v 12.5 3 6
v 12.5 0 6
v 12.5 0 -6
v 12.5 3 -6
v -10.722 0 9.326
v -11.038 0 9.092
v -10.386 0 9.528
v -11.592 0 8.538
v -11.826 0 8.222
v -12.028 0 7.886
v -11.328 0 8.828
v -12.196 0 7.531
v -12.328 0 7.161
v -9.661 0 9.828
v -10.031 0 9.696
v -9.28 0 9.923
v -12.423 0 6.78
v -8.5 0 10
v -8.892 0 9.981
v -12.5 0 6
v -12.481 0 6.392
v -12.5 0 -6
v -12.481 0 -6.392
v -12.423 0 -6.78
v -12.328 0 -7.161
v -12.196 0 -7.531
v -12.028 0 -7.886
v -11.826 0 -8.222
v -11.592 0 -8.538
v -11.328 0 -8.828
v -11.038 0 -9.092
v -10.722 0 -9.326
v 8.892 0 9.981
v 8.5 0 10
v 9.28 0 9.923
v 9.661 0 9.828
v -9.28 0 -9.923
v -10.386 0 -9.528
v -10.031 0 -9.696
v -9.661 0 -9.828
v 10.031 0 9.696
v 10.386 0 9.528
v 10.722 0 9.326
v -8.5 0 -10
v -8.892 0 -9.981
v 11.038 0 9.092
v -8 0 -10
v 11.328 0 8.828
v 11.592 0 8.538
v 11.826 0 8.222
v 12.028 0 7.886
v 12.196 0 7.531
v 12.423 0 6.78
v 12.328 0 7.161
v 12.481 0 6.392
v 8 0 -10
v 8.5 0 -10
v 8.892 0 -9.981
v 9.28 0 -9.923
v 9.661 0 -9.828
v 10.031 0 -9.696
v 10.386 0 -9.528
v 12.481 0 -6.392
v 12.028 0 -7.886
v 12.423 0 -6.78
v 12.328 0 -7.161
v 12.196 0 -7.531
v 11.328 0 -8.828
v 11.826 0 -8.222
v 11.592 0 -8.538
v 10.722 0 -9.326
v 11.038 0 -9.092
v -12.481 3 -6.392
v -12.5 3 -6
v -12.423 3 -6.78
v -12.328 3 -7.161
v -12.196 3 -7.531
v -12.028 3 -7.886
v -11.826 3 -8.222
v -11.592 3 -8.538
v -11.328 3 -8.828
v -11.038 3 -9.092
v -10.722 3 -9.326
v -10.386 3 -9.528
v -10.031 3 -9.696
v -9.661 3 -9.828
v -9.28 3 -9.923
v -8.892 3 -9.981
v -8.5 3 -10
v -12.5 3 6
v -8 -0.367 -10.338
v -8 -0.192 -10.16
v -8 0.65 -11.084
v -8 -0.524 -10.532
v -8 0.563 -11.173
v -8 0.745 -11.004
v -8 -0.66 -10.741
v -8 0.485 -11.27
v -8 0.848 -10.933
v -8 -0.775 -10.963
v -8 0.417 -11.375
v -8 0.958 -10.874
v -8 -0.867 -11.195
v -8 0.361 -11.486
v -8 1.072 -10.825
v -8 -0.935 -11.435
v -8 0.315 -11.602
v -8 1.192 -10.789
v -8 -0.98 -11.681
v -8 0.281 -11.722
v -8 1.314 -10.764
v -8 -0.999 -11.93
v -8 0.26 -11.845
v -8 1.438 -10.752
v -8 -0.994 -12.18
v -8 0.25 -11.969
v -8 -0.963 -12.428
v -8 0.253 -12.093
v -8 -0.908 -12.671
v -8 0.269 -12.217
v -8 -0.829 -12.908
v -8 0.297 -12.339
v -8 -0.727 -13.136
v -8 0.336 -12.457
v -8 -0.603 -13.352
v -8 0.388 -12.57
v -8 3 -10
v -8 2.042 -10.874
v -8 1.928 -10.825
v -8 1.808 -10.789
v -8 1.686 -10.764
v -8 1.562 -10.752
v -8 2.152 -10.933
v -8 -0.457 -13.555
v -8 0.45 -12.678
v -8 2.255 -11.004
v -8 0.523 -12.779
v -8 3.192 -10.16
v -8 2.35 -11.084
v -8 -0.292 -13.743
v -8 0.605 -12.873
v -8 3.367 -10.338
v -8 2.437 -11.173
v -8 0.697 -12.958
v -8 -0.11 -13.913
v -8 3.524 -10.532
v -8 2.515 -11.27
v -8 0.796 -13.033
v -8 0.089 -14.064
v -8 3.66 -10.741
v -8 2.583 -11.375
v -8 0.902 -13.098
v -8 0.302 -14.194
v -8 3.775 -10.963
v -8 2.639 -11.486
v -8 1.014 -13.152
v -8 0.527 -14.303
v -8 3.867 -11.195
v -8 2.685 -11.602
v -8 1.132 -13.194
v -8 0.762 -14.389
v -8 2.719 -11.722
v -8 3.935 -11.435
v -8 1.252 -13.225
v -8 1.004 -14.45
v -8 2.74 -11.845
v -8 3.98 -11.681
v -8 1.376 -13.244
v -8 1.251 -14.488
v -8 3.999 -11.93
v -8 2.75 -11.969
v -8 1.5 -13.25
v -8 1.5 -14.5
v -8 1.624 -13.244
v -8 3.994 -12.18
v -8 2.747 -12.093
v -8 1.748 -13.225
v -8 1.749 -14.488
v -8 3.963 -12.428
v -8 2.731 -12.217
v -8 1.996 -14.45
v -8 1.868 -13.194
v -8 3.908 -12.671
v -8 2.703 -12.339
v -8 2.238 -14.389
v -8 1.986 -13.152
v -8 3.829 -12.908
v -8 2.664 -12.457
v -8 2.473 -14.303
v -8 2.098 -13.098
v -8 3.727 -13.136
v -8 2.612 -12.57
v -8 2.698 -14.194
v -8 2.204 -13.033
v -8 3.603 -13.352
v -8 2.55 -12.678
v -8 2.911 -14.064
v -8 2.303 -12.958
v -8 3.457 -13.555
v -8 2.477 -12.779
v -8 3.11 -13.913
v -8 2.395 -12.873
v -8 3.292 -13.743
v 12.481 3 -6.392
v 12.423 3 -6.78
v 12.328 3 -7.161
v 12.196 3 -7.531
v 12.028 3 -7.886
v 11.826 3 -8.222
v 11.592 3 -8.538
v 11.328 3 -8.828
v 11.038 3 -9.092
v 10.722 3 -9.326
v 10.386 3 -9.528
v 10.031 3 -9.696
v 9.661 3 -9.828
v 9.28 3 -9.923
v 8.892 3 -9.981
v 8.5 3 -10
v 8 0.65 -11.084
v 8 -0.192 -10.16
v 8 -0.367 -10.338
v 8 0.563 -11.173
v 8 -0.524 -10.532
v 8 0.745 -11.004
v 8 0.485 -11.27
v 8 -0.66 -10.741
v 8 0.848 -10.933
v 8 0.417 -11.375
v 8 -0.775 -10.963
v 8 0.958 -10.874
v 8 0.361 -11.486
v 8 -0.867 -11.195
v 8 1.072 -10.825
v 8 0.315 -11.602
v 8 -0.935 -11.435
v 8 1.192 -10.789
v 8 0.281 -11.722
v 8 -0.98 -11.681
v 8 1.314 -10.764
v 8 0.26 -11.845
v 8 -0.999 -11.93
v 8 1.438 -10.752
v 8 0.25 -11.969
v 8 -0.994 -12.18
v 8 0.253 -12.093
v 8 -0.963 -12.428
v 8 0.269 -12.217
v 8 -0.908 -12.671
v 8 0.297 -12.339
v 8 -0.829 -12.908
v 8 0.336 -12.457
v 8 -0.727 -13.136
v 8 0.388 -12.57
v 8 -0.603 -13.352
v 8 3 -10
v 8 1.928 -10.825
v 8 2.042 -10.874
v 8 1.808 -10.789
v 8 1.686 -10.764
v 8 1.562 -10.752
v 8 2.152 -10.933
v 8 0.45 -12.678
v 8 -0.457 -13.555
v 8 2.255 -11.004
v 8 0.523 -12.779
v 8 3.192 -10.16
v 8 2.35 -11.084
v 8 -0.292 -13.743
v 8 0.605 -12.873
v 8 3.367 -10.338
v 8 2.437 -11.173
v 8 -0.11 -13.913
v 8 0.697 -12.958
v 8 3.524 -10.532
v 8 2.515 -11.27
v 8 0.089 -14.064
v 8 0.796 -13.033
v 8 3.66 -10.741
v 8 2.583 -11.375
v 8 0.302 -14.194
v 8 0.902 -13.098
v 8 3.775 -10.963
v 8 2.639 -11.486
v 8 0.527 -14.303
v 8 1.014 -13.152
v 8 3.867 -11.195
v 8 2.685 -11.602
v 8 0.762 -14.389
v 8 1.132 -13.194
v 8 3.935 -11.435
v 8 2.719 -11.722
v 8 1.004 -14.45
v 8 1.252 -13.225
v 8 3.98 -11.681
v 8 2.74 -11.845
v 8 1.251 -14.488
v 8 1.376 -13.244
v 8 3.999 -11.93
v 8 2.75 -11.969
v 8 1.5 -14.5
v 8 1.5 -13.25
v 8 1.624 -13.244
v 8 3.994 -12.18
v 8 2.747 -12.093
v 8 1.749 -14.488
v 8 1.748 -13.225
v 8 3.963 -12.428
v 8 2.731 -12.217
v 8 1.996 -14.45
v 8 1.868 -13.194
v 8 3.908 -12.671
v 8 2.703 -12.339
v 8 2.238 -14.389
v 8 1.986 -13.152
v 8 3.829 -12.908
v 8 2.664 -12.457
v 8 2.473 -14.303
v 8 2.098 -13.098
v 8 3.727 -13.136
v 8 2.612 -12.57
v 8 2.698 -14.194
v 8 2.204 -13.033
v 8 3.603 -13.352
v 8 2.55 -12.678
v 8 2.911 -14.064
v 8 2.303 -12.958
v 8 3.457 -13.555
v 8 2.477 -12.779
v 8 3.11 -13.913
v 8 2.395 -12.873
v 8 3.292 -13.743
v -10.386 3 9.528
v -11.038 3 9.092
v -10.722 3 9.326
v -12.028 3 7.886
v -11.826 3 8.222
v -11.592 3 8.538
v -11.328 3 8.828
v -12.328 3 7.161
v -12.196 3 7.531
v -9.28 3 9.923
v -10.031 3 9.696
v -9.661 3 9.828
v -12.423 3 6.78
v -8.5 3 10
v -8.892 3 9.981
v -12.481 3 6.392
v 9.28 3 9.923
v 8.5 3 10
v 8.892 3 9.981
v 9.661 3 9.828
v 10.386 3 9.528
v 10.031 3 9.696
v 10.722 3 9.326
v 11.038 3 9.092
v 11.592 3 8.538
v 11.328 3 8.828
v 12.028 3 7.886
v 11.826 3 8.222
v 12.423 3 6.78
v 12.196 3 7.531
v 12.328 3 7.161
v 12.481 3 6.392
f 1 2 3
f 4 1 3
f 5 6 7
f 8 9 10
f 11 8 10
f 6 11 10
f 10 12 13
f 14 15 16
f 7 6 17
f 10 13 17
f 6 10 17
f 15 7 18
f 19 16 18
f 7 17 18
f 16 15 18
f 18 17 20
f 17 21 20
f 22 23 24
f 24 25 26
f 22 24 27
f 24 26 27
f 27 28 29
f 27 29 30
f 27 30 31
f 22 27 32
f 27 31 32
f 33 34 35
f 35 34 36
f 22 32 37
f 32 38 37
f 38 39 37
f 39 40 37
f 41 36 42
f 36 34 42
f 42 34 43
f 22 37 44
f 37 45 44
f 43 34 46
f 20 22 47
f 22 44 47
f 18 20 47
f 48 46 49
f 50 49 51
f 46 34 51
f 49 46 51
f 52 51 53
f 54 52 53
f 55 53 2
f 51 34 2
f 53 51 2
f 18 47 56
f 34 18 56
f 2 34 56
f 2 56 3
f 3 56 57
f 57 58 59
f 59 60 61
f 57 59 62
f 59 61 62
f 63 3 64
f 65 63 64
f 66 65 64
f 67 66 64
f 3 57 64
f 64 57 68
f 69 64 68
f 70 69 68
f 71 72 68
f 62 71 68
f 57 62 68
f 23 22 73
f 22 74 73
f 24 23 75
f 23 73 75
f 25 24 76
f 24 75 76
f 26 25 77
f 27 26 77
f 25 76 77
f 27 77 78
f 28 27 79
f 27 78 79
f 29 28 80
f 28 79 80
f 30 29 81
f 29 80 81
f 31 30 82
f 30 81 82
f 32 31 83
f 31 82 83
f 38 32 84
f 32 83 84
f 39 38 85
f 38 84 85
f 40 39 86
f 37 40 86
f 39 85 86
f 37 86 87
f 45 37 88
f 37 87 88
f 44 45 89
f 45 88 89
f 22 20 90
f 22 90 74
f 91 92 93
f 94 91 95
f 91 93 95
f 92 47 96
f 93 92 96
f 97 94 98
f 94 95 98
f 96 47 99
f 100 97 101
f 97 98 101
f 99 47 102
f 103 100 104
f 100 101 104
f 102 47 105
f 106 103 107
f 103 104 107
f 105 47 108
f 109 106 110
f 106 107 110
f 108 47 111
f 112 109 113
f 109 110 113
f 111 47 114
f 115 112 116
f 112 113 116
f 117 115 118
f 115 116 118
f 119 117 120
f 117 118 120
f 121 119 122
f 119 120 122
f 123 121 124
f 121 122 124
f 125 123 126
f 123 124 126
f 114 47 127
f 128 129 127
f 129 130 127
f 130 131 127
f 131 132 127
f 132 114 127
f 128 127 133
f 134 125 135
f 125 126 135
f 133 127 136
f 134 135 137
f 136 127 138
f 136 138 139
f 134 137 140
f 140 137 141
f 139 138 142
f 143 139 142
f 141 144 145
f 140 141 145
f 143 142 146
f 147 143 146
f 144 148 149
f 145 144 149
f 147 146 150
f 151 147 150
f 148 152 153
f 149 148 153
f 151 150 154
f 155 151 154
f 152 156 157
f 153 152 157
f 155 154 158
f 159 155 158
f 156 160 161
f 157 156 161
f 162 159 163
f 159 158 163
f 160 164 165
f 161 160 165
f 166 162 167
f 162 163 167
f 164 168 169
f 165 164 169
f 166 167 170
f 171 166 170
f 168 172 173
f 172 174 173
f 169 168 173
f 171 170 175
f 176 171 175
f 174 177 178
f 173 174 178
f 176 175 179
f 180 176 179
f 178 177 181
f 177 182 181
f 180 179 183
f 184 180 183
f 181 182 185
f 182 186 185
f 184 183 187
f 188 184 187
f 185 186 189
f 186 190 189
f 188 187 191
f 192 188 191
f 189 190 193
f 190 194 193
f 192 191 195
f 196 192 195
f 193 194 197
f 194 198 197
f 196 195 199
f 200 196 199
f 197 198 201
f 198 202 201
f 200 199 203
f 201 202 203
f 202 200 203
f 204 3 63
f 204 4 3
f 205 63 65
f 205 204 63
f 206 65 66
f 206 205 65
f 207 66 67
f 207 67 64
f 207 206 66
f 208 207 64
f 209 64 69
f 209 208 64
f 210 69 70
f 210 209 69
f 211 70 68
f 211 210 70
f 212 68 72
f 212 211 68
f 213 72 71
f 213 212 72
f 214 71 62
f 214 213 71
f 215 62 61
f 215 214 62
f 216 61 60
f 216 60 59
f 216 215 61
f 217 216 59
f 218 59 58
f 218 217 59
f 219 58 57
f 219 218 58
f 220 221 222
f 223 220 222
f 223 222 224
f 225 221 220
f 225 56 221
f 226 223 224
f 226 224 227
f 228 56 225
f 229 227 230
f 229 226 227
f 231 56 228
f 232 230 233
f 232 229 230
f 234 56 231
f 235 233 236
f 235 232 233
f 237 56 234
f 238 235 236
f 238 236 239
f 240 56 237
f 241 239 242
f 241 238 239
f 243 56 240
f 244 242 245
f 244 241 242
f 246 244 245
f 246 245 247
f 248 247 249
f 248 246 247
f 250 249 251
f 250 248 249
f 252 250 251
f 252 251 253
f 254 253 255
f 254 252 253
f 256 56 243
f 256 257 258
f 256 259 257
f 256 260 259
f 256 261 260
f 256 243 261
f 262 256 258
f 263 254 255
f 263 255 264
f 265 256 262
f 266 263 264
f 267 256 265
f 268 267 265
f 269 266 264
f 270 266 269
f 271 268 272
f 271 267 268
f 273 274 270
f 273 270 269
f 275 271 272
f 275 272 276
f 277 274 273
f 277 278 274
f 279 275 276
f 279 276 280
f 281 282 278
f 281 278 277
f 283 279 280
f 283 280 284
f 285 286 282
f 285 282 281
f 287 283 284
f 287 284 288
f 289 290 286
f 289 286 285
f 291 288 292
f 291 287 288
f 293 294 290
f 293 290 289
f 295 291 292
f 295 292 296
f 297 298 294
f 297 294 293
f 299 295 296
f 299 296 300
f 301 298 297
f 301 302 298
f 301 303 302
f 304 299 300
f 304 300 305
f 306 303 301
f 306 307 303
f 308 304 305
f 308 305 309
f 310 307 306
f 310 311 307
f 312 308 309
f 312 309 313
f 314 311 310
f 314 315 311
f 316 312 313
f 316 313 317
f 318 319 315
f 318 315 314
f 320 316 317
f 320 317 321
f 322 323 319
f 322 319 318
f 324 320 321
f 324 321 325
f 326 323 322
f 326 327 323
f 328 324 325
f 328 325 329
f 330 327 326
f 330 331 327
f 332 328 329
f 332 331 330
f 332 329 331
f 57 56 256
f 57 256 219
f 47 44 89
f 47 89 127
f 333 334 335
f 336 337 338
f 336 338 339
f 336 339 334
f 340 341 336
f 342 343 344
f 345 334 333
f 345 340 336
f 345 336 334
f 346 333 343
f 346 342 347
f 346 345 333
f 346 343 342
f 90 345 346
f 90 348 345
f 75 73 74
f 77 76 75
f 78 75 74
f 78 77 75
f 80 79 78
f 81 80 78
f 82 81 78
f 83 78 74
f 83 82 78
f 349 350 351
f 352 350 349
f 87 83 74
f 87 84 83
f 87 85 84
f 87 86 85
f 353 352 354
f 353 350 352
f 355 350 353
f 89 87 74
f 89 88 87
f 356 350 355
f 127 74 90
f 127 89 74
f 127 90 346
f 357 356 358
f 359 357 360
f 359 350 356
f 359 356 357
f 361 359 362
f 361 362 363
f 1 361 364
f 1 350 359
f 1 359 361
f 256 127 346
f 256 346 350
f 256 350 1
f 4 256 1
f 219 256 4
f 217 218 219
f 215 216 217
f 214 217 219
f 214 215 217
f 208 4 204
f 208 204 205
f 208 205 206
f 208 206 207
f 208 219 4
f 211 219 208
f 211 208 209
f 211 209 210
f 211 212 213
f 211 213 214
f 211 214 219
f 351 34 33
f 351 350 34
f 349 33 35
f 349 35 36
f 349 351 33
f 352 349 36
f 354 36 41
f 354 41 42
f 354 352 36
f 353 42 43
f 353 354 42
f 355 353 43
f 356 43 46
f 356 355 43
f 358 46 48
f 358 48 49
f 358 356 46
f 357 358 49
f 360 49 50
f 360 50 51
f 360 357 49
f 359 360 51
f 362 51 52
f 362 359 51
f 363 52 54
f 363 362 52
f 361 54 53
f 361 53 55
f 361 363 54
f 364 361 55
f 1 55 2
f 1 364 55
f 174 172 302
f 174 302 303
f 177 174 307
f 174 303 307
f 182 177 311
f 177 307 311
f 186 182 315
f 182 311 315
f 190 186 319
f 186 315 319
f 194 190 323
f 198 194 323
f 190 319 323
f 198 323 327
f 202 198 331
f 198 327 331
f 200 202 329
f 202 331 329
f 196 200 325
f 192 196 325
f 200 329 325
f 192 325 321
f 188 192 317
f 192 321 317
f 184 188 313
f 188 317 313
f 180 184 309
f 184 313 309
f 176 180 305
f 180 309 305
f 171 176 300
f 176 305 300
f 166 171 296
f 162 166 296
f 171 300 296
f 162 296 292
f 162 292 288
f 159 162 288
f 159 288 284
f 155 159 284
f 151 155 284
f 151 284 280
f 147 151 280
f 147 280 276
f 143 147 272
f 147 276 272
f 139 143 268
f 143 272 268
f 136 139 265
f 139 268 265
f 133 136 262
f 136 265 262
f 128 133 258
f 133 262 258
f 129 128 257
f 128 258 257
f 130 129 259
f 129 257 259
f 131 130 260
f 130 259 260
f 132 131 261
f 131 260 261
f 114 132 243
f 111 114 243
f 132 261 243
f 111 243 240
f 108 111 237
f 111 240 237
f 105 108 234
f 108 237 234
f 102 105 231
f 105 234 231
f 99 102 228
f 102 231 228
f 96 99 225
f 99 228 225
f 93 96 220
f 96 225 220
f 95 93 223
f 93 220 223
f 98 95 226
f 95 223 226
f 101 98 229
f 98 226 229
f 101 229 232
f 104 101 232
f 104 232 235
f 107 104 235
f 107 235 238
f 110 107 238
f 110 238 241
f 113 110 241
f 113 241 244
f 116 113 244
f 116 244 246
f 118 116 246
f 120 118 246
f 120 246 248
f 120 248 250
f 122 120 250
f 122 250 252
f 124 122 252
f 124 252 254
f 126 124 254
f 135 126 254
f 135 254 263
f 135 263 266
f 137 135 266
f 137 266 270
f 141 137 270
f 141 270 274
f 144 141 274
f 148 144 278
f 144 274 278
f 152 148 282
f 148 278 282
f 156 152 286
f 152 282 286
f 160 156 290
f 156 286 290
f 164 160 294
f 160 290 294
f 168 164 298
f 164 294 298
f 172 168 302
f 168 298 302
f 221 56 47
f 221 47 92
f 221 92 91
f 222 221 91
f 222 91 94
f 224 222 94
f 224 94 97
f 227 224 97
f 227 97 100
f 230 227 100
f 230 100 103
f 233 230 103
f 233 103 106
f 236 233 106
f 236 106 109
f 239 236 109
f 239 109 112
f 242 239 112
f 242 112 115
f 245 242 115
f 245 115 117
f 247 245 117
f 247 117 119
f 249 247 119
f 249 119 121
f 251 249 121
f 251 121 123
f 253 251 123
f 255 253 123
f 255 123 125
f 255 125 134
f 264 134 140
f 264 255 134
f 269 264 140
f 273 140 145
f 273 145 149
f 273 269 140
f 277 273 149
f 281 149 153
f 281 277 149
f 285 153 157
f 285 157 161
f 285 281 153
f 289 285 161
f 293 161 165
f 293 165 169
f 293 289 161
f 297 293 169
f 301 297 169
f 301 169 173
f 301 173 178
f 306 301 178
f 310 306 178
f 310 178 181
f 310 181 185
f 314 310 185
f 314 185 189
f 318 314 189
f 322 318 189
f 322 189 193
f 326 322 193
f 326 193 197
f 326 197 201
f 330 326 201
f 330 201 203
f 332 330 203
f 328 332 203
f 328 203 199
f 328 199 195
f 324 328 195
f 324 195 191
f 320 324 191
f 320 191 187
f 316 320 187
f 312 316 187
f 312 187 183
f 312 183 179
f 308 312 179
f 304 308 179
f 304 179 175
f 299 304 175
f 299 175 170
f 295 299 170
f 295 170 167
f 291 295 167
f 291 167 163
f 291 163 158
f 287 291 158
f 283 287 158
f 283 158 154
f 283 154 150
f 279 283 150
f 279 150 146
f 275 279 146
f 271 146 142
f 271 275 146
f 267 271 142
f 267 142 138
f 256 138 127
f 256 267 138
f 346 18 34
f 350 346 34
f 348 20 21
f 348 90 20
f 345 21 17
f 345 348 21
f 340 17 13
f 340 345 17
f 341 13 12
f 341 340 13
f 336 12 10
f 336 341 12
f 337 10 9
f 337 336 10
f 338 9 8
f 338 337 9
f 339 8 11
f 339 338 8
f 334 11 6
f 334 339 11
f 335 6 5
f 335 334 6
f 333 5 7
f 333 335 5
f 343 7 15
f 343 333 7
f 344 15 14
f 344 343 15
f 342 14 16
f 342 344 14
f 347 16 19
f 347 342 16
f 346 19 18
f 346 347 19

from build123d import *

# Parameters (mm, degrees)
SKETCH2_W           = 25
SKETCH2_H           = 20
BOSS_EXTRUDE1_DEPTH = 3
FILLET1_R           = 4
SKETCH4_R           = 2.5
BOSS_EXTRUDE2_DEPTH = 8
SKETCH5_R           = 1.25
CUT_EXTRUDE1_DEPTH  = 16


with BuildPart() as part:
    # Sketch2 → Boss-Extrude1 (new body)
    with BuildSketch(Plane(origin=(0, 0, 0), x_dir=(1, 0, 0), z_dir=(0, 1, 0))):
        Rectangle(SKETCH2_W, SKETCH2_H)
    extrude(amount=BOSS_EXTRUDE1_DEPTH)

    # Fillet1
    fillet1_edges = [part.edges().sort_by_distance(p)[0] for p in [
        (12.5, 1.5, 10),
        (-12.5, 1.5, 10),
        (-12.5, 1.5, -10),
        (12.5, 1.5, -10),
    ]]
    fillet(fillet1_edges, radius=FILLET1_R)

    # Sketch4 → Boss-Extrude2 (add, symmetric)
    with BuildSketch(Plane(origin=(0, 0, 0), x_dir=(0, 0, -1), z_dir=(1, 0, 0))):
        with Locations((12, 1.5)):
            Circle(SKETCH4_R)
    extrude(amount=BOSS_EXTRUDE2_DEPTH, both=True)

    # Sketch5 → Cut-Extrude1 (cut)
    with BuildSketch(Plane(origin=(8, 0, 0), x_dir=(0, 0, -1), z_dir=(1, 0, 0))):
        with Locations((12, 1.5)):
            Circle(SKETCH5_R)
    extrude(amount=-CUT_EXTRUDE1_DEPTH, mode=Mode.SUBTRACT)


solid = part.part
